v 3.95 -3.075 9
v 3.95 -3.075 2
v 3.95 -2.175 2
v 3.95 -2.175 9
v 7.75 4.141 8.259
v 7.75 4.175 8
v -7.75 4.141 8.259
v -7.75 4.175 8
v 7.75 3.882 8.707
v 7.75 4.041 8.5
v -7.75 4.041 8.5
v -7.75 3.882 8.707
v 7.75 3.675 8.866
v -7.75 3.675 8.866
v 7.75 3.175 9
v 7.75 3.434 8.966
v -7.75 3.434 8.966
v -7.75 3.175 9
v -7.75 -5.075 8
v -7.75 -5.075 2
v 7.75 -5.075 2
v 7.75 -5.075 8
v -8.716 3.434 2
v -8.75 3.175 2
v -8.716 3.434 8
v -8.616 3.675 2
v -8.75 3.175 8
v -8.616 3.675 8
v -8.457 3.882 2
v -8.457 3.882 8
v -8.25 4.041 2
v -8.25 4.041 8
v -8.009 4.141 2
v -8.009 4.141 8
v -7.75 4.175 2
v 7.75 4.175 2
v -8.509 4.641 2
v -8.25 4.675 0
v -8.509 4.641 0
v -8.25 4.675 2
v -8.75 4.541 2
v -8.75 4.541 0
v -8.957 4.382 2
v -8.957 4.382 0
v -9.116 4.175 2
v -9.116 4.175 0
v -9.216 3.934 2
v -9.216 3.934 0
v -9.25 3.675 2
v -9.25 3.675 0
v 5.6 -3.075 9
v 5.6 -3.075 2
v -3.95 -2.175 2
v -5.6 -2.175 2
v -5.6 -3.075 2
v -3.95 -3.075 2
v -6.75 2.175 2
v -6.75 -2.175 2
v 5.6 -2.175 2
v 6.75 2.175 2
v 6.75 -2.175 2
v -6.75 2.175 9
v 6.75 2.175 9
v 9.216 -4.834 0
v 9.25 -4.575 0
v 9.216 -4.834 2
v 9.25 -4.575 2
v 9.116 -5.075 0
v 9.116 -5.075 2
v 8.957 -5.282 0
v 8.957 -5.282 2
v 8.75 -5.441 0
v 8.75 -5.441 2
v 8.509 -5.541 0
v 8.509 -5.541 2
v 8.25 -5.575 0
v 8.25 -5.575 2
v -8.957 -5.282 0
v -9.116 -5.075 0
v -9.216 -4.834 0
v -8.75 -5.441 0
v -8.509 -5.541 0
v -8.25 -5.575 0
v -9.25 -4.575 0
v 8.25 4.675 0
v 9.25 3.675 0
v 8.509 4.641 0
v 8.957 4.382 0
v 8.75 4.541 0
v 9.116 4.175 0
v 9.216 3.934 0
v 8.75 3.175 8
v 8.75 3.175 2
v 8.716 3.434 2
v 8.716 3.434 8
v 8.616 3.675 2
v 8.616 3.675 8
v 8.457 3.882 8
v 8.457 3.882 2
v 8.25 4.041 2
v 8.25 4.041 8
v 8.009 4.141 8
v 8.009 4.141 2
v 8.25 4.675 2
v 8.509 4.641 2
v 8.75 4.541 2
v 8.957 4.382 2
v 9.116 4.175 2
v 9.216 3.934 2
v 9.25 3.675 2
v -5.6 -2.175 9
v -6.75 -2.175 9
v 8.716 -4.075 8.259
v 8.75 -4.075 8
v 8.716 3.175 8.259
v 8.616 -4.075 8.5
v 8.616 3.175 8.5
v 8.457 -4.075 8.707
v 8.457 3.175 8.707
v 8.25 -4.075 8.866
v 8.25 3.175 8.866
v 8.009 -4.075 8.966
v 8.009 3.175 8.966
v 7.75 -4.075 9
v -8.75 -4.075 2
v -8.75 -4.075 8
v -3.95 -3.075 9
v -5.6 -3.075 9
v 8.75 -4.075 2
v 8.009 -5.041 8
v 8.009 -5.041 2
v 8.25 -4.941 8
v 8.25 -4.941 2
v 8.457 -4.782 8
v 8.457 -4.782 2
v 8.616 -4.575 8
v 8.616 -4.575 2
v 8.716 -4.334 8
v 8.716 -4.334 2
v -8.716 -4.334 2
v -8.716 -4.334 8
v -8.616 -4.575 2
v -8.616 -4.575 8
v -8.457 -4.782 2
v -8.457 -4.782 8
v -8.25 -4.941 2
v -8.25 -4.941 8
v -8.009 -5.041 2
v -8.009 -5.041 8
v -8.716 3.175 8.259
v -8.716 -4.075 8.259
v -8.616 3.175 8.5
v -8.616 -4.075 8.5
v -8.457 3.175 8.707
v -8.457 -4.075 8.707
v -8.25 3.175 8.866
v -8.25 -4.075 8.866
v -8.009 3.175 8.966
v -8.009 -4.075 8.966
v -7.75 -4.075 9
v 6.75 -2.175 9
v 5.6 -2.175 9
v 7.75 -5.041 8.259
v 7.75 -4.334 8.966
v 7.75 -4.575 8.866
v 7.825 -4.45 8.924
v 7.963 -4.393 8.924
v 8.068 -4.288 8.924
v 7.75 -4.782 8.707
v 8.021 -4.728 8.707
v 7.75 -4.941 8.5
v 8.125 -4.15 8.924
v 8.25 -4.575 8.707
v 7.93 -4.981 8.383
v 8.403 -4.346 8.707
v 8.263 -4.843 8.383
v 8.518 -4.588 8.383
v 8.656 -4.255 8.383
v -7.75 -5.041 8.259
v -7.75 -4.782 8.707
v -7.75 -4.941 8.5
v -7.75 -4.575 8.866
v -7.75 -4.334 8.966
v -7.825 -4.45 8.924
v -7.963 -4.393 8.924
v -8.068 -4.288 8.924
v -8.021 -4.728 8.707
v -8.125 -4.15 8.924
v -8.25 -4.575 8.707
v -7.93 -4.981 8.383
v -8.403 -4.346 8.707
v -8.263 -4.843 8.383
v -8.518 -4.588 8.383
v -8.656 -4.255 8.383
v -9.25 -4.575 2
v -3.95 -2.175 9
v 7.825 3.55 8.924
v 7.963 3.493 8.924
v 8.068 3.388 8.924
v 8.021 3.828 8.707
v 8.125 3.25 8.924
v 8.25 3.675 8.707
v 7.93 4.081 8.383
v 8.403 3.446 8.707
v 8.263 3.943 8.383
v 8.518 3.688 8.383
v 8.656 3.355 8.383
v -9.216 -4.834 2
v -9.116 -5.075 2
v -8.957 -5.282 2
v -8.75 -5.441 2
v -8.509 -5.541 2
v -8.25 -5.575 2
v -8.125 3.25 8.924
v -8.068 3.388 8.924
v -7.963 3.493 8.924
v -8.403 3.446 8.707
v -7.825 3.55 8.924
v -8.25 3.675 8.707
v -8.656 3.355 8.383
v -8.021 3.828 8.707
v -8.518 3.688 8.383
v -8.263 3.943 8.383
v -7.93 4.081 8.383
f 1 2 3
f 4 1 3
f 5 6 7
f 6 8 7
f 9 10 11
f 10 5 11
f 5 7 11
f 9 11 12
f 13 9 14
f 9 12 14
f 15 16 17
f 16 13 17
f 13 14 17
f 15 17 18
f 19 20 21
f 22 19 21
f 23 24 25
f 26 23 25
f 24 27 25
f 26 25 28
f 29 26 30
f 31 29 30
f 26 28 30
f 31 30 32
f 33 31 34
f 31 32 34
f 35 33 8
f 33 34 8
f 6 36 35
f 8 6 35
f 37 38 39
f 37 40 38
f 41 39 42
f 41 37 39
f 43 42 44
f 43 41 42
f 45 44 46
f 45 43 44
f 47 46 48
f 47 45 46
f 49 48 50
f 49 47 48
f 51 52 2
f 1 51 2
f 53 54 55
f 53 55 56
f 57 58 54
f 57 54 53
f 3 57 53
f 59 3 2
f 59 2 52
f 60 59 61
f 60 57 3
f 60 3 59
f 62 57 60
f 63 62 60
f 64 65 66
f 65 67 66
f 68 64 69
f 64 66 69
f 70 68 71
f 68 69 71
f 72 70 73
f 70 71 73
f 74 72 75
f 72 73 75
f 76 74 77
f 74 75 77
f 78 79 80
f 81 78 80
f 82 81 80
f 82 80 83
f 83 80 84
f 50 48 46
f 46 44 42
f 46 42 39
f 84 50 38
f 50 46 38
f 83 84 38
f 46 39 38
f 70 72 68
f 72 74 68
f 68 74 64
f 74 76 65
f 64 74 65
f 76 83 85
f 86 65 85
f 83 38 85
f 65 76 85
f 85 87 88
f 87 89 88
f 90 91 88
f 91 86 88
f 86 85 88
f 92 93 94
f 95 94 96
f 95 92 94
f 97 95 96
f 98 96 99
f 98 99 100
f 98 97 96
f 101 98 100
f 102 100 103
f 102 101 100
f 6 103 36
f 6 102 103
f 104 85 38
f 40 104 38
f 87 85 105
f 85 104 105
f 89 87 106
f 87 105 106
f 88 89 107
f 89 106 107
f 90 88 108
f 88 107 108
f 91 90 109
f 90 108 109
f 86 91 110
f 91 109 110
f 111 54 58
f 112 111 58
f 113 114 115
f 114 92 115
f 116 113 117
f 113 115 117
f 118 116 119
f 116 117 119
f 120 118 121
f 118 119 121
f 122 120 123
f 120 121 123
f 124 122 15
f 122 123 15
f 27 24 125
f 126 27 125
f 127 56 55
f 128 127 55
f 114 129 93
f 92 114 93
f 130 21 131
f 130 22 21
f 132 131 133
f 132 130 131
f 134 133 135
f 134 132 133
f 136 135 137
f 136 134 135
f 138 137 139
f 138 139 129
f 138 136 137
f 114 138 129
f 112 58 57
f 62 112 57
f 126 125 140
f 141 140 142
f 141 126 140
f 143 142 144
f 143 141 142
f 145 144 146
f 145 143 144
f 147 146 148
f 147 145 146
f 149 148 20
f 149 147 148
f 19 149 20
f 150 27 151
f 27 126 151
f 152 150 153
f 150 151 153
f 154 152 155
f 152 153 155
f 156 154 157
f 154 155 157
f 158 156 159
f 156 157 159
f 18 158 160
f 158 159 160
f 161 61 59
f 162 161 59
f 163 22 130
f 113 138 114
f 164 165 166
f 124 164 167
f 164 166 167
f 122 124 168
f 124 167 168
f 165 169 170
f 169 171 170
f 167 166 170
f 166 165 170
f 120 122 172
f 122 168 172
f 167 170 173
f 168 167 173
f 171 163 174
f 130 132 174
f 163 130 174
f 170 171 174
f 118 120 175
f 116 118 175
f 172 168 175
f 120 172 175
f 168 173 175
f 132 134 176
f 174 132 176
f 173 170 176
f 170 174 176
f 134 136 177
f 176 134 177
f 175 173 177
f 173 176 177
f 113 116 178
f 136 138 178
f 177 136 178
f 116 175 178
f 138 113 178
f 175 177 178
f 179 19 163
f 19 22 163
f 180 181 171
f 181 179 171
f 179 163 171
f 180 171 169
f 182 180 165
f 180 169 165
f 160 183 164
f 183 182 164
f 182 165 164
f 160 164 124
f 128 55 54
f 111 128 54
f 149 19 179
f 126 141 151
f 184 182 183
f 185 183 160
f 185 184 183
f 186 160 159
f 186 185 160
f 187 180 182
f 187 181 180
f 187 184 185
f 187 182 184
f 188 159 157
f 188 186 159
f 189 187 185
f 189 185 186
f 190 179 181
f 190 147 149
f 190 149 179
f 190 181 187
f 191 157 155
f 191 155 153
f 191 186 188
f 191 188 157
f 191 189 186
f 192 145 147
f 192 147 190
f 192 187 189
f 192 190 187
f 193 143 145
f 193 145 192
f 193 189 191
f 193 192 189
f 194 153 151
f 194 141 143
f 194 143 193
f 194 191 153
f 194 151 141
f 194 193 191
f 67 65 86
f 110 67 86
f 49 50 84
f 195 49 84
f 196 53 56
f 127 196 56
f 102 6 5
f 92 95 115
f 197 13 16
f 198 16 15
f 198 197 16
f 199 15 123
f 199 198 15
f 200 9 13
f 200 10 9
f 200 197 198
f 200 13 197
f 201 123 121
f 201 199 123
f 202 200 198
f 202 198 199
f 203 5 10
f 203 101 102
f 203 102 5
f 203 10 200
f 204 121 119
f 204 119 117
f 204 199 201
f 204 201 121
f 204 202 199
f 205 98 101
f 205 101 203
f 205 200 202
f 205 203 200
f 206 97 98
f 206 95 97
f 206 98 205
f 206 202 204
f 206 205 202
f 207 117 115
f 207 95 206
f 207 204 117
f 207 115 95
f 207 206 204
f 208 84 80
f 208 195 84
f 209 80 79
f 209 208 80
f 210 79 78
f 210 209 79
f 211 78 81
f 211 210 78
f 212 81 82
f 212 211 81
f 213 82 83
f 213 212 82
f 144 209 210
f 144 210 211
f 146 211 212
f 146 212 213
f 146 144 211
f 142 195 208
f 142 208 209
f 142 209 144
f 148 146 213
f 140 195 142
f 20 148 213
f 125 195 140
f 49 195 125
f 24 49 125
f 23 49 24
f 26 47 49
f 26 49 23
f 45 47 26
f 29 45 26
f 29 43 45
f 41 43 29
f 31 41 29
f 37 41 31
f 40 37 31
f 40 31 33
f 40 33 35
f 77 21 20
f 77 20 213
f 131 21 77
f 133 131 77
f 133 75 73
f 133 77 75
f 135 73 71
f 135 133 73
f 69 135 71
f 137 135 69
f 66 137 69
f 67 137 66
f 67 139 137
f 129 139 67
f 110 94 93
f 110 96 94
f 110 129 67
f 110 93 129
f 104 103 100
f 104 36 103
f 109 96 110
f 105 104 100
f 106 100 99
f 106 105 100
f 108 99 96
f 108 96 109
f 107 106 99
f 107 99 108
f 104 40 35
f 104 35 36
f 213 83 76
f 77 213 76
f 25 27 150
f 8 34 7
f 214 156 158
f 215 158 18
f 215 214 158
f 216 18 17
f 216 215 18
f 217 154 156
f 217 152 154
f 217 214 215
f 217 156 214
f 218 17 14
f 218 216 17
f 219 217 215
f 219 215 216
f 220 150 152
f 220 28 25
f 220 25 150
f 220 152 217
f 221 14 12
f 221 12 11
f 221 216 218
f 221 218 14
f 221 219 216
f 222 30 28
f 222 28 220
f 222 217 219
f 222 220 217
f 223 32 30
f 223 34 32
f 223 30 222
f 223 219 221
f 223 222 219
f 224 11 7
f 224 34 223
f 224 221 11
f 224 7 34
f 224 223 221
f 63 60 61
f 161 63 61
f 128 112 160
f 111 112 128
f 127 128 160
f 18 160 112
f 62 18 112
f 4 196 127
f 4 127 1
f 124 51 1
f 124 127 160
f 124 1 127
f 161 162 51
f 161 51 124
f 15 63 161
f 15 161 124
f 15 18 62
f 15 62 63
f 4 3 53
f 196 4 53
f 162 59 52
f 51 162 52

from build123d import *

# Parameters (mm, degrees)
F0_W     = 1.65
F0_H     = 0.9
F1_DEPTH = 2
F2_DEPTH = 9
F3_R     = 1


with BuildPart() as f1:
    # F0 (on Top) → F1 (new body)
    with BuildSketch(Plane.XY):
        Polygon((9.25, -2.175), (9.25, 4.675), (-9.25, 4.675), (-9.25, -2.175), (-9.25, -5.575), (3.95, -5.575), (5.6, -5.575), (9.25, -5.575), align=None)
        Polygon((-8.75, -2.175), (-8.75, 4.175), (8.75, 4.175), (8.75, -2.175), (8.75, -5.075), (5.6, -5.075), (3.95, -5.075), (-8.75, -5.075), align=None, mode=Mode.SUBTRACT)
        Polygon((8.75, 4.175), (-8.75, 4.175), (-8.75, -2.175), (-8.75, -5.075), (3.95, -5.075), (5.6, -5.075), (8.75, -5.075), (8.75, -2.175), align=None)
        Polygon((-6.75, 2.175), (6.75, 2.175), (6.75, -2.175), (5.6, -2.175), (5.6, -3.075), (3.95, -3.075), (3.95, -2.175), (-3.95, -2.175), (-3.95, -3.075), (-5.6, -3.075), (-5.6, -2.175), (-6.75, -2.175), align=None, mode=Mode.SUBTRACT)
        Polygon((6.75, -2.175), (6.75, 2.175), (-6.75, 2.175), (-6.75, -2.175), (-5.6, -2.175), (-3.95, -2.175), (3.95, -2.175), (5.6, -2.175), align=None)
        with Locations((-4.775, -2.625)):
            Rectangle(F0_W, F0_H)
        with Locations((4.775, -2.625)):
            Rectangle(F0_W, F0_H)
    extrude(amount=F1_DEPTH)

    # F0 (on Top) → F2 (join)
    with BuildSketch(Plane.XY):
        Polygon((8.75, 4.175), (-8.75, 4.175), (-8.75, -2.175), (-8.75, -5.075), (3.95, -5.075), (5.6, -5.075), (8.75, -5.075), (8.75, -2.175), align=None)
        Polygon((-6.75, 2.175), (6.75, 2.175), (6.75, -2.175), (5.6, -2.175), (5.6, -3.075), (3.95, -3.075), (3.95, -2.175), (-3.95, -2.175), (-3.95, -3.075), (-5.6, -3.075), (-5.6, -2.175), (-6.75, -2.175), align=None, mode=Mode.SUBTRACT)
    extrude(amount=F2_DEPTH)

    # F3
    f3_edges = [f1.edges().sort_by_distance(p)[0] for p in [
        (-9.25, -5.575, 1),
        (-8.75, -5.075, 5.5),
        (-9.25, 4.675, 1),
        (-8.75, 4.175, 5.5),
        (8.75, -5.075, 5.5),
        (9.25, -5.575, 1),
        (8.75, 4.175, 5.5),
        (9.25, 4.675, 1),
        (0, -5.075, 9),
        (-8.75, -0.45, 9),
        (0, 4.175, 9),
        (8.75, -0.45, 9),
    ]]
    fillet(f3_edges, radius=F3_R)


solid = f1.part
